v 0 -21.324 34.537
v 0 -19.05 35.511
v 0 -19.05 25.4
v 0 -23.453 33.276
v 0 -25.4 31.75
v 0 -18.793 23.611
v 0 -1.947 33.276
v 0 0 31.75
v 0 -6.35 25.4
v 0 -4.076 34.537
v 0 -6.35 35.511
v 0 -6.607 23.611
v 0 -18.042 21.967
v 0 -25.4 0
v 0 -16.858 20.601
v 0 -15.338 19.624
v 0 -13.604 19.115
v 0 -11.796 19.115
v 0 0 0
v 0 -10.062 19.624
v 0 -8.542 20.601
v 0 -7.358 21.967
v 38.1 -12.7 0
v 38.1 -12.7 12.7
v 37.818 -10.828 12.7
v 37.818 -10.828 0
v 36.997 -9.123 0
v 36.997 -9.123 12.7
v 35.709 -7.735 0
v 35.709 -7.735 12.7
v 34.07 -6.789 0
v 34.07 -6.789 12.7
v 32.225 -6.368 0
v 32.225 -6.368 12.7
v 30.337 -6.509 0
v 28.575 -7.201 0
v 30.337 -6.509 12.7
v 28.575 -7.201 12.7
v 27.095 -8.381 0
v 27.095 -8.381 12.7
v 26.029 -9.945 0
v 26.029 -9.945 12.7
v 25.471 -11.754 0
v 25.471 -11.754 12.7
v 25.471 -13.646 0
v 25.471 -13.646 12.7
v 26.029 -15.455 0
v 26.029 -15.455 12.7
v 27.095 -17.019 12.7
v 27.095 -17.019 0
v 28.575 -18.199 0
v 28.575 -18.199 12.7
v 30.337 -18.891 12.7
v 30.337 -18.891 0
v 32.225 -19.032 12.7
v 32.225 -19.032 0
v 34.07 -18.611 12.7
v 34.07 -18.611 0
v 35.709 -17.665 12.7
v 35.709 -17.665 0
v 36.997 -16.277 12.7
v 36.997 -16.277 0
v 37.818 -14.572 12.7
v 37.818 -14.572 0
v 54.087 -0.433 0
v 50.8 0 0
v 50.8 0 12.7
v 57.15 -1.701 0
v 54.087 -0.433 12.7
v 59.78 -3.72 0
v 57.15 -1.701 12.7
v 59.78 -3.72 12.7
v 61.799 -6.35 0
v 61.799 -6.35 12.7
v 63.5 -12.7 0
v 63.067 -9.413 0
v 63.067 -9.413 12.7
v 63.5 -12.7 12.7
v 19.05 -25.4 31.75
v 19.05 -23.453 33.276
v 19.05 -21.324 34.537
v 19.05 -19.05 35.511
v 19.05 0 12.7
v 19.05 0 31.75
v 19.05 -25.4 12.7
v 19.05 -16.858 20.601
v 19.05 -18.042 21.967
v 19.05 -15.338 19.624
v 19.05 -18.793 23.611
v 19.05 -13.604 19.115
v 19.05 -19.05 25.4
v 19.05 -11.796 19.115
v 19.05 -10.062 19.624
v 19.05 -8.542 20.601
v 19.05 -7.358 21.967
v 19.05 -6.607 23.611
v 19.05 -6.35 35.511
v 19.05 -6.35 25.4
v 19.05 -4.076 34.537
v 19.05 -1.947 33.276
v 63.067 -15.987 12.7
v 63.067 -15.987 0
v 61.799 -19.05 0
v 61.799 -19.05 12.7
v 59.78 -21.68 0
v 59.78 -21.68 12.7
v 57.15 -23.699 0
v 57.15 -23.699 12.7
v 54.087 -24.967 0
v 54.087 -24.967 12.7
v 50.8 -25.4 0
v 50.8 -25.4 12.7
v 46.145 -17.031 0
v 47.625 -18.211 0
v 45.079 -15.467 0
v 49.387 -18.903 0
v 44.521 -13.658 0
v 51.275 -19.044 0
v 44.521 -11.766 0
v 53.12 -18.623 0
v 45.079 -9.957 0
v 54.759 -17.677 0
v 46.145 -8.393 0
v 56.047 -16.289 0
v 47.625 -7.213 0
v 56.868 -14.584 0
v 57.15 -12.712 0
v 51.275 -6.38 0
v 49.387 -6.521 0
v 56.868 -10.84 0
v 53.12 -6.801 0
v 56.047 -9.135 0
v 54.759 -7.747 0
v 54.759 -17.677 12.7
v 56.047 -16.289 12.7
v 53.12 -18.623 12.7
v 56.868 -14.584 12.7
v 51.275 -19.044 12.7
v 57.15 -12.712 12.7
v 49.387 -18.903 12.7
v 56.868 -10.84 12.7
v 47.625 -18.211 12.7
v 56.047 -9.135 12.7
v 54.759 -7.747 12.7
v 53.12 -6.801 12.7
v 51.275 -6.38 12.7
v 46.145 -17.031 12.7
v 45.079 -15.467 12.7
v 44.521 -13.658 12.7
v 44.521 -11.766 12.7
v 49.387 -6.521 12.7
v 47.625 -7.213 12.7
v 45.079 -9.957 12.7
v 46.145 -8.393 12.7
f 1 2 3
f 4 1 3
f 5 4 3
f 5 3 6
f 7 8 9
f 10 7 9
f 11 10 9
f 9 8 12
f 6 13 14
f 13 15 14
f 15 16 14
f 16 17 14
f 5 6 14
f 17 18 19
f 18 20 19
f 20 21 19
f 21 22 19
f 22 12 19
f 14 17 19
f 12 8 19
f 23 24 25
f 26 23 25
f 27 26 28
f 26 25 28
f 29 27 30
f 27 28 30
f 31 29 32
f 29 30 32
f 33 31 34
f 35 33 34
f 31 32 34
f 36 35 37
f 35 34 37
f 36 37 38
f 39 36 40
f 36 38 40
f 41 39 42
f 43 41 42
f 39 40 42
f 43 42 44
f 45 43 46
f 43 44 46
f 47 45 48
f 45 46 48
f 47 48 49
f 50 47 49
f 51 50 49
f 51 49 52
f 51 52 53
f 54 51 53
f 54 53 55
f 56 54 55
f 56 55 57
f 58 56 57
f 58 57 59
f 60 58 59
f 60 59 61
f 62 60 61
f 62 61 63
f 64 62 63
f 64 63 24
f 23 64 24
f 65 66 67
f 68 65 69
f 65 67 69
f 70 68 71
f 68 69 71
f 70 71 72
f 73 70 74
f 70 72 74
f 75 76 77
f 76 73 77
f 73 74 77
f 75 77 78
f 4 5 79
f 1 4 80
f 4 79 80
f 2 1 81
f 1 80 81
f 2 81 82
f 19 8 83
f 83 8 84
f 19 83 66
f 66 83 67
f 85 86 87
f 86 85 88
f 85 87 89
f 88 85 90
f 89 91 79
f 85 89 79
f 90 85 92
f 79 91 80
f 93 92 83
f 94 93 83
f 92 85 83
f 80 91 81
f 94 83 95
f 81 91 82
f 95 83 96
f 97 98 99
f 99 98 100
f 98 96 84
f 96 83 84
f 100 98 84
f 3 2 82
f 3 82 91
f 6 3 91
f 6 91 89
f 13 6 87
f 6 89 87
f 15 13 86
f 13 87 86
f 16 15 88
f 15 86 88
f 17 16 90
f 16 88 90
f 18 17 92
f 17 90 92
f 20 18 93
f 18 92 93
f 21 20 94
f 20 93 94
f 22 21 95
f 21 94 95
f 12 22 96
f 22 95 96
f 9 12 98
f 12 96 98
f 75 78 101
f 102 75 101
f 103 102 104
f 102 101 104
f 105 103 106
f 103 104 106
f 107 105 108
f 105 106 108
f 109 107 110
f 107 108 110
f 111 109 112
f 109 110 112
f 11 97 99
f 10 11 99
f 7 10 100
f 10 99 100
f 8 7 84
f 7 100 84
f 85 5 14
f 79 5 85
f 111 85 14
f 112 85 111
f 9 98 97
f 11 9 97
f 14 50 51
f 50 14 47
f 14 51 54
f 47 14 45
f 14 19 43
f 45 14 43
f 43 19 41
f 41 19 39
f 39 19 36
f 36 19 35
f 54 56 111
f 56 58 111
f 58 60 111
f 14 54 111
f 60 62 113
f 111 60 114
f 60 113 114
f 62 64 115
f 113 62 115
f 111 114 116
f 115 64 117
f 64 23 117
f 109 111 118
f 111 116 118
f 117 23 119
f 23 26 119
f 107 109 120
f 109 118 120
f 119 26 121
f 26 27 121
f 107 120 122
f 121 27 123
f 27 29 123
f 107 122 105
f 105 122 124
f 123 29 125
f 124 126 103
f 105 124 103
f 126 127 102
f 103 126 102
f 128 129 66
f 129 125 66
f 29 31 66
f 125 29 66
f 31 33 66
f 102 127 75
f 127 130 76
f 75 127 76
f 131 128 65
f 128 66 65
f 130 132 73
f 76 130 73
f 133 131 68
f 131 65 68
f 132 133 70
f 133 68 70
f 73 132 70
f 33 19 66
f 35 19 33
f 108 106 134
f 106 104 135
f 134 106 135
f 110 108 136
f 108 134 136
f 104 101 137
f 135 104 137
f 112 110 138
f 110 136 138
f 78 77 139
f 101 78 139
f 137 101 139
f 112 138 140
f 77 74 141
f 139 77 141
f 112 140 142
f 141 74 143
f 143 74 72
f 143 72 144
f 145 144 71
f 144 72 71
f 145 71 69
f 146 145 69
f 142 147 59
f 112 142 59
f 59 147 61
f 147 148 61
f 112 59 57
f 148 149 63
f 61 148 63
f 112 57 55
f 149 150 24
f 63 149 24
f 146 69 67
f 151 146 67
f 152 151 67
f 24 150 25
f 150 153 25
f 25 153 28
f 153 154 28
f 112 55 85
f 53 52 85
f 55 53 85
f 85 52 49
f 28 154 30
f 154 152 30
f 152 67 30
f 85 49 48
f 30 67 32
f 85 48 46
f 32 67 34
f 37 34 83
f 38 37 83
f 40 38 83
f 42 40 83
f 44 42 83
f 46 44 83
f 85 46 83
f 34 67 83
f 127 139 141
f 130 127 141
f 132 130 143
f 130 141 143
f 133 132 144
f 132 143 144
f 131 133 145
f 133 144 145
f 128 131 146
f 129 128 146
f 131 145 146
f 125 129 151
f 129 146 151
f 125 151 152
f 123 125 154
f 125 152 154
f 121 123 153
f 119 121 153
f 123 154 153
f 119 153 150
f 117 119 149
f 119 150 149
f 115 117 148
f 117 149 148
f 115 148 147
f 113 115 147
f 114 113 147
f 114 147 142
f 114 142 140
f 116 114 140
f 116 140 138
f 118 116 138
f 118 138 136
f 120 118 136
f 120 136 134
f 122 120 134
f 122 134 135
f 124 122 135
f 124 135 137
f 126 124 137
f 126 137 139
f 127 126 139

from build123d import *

# Parameters (mm, degrees)
F1_DEPTH  = 25.4
F2_R      = 6.35
F3_DEPTH  = 25.4
F5_DEPTH  = 25.4
F8_DEPTH  = 25.4
F10_DEPTH = 25.4


with BuildPart() as f1:
    # F0 (on Front) → F1 (new body)
    with BuildSketch(Plane.XZ):
        Polygon((0, 38.1), (0, 0), (63.5, 0), (63.5, 12.7), (19.05, 12.7), (19.05, 38.1), align=None)
    extrude(amount=F1_DEPTH)

    # F2 (on face) → F3 (cut)
    with BuildSketch(Plane.XY.offset(12.7)):
        with Locations((31.7500038045, -12.7)):
            Circle(F2_R)
        with Locations((50.8, -12.7120396)):
            Circle(F2_R)
    extrude(amount=-F3_DEPTH, mode=Mode.SUBTRACT)

    # F4 (on face) → F5 (cut)
    with BuildSketch(Plane.XY.offset(12.7)):
        with BuildLine():
            ThreePointArc((63.5, -12.7), (59.7802561211, -21.6802561211), (50.8, -25.4))
            Line((50.8, -25.4), (63.5, -25.4))
            Line((63.5, -25.4), (63.5, -12.7))
        make_face()
        with BuildLine():
            ThreePointArc((50.8, 0), (59.7802561211, -3.7197438789), (63.5, -12.7))
            Line((63.5, -12.7), (63.5, 0))
            Line((63.5, 0), (50.8, 0))
        make_face()
    extrude(amount=-F5_DEPTH, mode=Mode.SUBTRACT)

    # F7 (on face) → F8 (cut)
    with BuildSketch(Plane.YZ.offset(19.05)):
        with BuildLine():
            ThreePointArc((-19.05, 25.4), (-12.7, 19.05), (-6.35, 25.4))
            ThreePointArc((-6.35, 25.4), (-12.7, 31.75), (-19.05, 25.4))
        make_face()
        with BuildLine():
            ThreePointArc((-19.05, 25.4), (-12.7, 31.75), (-6.35, 25.4))
            Line((-6.35, 25.4), (-6.35, 38.1))
            Line((-6.35, 38.1), (-19.05, 38.1))
            Line((-19.05, 38.1), (-19.05, 25.4))
        make_face()
    extrude(amount=-F8_DEPTH, mode=Mode.SUBTRACT)

    # F9 (on face) → F10 (cut)
    with BuildSketch(Plane.YZ.offset(19.05)):
        with BuildLine():
            ThreePointArc((-25.4, 31.75), (-12.7, 36.6009683429), (0, 31.75))
            Line((0, 31.75), (0, 38.1))
            Line((0, 38.1), (-25.4, 38.1))
            Line((-25.4, 38.1), (-25.4, 31.75))
        make_face()
    extrude(amount=-F10_DEPTH, mode=Mode.SUBTRACT)


solid = f1.part
